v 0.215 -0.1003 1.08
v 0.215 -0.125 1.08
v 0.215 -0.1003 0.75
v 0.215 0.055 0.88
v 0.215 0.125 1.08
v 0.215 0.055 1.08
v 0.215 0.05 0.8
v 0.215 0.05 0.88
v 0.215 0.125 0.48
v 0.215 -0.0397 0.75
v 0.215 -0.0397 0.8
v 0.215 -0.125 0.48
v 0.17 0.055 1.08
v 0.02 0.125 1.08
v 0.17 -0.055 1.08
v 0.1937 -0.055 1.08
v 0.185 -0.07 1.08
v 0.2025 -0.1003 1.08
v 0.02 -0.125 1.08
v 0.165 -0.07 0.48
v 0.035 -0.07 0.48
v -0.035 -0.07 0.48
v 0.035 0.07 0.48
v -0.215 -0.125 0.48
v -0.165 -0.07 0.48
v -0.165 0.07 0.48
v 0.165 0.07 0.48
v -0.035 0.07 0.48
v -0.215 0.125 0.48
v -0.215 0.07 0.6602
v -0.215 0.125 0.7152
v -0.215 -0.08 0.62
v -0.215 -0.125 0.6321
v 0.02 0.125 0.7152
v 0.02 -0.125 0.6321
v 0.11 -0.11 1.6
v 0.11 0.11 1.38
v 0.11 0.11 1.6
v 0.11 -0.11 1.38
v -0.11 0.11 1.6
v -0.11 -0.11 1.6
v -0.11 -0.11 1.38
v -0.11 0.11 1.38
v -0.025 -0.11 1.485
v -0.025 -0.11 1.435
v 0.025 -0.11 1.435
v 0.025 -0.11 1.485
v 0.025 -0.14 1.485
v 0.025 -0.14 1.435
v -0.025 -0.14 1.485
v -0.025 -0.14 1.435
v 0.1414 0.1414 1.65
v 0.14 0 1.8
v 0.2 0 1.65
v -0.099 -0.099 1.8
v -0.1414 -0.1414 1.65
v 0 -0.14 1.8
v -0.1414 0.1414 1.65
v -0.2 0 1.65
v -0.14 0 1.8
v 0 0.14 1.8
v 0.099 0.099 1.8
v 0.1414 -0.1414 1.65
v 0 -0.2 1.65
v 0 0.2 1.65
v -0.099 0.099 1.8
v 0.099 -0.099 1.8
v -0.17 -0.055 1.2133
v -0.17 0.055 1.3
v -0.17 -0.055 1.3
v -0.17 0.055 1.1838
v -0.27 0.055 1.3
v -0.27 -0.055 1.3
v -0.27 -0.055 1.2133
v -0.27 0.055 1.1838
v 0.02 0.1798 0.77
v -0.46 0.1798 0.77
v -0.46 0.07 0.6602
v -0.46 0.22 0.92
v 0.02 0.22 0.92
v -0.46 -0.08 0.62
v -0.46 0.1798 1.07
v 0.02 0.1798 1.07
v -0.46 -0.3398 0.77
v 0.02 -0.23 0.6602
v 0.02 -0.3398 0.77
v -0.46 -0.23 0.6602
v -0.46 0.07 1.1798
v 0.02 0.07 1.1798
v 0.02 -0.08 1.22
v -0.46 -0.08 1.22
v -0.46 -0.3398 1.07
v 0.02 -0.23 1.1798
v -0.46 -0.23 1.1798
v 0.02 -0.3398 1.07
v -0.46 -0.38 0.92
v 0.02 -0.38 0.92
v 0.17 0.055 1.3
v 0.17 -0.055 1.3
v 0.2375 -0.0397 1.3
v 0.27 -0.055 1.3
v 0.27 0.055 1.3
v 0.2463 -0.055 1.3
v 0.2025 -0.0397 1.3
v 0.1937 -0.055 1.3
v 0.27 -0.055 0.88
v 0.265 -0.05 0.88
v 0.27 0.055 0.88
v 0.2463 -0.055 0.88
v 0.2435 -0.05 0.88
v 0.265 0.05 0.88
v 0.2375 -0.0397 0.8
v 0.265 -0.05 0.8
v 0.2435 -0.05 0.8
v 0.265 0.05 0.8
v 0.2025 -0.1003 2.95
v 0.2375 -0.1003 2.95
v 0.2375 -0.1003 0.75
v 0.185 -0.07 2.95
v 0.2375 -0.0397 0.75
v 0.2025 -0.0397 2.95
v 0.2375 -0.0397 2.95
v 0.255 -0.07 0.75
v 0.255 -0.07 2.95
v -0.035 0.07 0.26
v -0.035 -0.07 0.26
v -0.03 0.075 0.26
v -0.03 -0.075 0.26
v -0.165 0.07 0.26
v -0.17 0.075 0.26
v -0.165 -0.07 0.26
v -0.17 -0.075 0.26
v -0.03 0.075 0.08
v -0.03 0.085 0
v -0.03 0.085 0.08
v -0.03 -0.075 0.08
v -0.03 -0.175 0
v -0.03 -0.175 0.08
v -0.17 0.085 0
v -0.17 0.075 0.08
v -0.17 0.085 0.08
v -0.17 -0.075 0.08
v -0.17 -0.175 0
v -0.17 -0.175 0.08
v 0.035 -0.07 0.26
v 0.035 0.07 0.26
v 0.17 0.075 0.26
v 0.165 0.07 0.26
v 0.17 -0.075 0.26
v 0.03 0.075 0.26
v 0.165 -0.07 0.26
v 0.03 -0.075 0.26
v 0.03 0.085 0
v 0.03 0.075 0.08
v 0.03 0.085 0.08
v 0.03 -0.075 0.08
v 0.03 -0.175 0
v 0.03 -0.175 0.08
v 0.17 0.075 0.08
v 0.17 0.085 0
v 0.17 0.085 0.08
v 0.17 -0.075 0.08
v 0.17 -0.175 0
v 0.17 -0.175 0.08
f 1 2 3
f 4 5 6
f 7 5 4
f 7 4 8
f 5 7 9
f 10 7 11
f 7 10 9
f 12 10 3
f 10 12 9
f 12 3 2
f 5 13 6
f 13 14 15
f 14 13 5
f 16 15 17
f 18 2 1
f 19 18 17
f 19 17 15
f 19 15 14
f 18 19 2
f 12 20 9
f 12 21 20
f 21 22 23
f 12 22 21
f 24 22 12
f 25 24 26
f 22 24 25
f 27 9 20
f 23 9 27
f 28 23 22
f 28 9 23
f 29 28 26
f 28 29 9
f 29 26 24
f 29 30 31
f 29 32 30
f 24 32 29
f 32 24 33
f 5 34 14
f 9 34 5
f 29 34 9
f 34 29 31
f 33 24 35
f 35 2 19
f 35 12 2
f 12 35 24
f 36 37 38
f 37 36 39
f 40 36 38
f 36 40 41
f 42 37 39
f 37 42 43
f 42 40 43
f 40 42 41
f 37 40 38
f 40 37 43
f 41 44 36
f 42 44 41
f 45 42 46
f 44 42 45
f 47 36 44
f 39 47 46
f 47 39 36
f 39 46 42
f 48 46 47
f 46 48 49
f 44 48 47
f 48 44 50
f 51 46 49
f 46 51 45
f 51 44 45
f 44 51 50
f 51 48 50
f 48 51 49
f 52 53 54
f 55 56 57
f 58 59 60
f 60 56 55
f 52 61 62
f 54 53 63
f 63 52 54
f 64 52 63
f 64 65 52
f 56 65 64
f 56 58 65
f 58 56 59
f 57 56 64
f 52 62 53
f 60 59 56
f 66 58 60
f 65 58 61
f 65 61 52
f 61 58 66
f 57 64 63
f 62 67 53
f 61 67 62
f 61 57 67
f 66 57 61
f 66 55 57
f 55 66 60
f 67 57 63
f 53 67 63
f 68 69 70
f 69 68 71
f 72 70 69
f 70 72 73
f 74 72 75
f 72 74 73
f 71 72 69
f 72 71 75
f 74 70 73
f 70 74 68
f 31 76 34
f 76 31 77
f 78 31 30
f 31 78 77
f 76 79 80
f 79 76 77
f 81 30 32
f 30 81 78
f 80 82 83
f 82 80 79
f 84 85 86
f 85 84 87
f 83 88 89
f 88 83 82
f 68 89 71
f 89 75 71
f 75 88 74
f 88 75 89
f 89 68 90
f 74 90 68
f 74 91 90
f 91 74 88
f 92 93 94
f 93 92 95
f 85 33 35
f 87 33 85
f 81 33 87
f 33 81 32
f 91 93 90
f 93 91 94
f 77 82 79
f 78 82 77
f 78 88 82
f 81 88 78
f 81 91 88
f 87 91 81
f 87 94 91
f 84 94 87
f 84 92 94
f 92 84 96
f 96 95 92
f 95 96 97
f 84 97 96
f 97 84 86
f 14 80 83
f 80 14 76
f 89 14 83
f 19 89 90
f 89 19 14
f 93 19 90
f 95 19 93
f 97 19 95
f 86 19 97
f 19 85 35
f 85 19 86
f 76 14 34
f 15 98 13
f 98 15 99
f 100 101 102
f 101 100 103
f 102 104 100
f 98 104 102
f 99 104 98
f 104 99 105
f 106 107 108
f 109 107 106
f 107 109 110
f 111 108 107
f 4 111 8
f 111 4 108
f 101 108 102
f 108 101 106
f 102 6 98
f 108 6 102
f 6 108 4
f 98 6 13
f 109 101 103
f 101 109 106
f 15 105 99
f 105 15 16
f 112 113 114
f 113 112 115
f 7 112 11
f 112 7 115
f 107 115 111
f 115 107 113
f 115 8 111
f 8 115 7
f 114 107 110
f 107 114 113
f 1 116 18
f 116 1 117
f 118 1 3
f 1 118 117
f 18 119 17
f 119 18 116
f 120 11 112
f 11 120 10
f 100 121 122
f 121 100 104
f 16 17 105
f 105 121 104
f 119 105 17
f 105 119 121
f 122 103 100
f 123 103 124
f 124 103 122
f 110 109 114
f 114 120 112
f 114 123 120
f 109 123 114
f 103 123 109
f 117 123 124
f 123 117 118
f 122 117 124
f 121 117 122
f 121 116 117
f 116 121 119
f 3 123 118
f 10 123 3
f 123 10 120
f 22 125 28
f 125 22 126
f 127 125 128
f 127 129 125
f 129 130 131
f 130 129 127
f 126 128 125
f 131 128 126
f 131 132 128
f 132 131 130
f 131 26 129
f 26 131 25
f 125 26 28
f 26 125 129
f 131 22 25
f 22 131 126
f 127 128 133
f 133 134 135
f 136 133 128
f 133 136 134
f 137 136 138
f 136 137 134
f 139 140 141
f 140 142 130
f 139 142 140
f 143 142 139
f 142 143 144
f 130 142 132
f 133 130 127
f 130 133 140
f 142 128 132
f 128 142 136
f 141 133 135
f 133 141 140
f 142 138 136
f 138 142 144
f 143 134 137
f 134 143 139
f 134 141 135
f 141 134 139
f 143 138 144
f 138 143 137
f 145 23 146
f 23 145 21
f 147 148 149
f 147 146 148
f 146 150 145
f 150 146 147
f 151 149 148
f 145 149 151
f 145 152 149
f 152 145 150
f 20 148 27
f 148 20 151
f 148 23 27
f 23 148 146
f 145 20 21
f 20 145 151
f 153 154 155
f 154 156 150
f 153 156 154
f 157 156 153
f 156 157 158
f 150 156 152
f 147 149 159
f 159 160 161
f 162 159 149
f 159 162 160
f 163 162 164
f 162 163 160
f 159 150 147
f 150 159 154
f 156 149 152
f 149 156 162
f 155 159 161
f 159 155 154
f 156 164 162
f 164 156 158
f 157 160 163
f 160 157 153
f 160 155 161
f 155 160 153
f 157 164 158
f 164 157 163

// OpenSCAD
// file: ../lib/kit_tw.scad
// kit_tw.scad — NextTotalwar 低模战场与角色零件库。
// 纯零件库；落地件底面 z=0，带朝向件 front=-y。

use <kit_char.scad>

function tw_WOOD() = [0.30, 0.20, 0.12];
function tw_WOOD_DARK() = [0.18, 0.11, 0.07];
function tw_STONE() = [0.34, 0.34, 0.31];
function tw_METAL() = [0.20, 0.22, 0.23];
function tw_LEATHER() = [0.28, 0.16, 0.09];
function tw_CLOTH() = ch_TINT();
function tw_sq(x) = (x * x + x * 613 + 47) % 65521;
function tw_rnd(s, m) = tw_sq(tw_sq(((s % 65521) + 65521) % 65521) + 17) % m;

module tw_boxc(s) cube(s, center=true);
module tw_slab(L=4, D=4, t=0.2) translate([0, 0, t/2]) tw_boxc([L, D, t]);

module tw_bldg_palisade(L=8, H=2.7, seed=0)
{
    n = max(3, floor(L / 0.42));
    for (i=[0:n-1])
        color(i % 3 == 0 ? tw_WOOD_DARK() : tw_WOOD())
            translate([-L/2 + (i+0.5)*L/n, 0, H/2])
                cylinder(h=H, r=0.22, $fn=6, center=true);
    color(tw_WOOD_DARK()) for (z=[0.75, 1.8])
        translate([0, 0.12, z]) tw_boxc([L+0.15, 0.16, 0.14]);
}

module tw_bldg_watchtower(seed=0)
{
    H = 6.0;
    for (sx=[-1,1], sy=[-1,1])
        color(tw_WOOD_DARK())
            translate([sx*1.05, sy*1.05, H/2])
                rotate([sy*5, sx*-5, 0]) tw_boxc([0.20, 0.20, H]);
    color(tw_WOOD()) translate([0, 0, H]) tw_slab(3.4, 3.4, 0.22);
    color(tw_WOOD()) translate([0, 0, H+0.22]) tw_slab(2.5, 2.5, 1.25);
    color([0.22, 0.13, 0.08]) translate([0, 0, H+1.47])
        cylinder(h=1.15, r1=2.0, r2=0.15, $fn=4);
    color(tw_WOOD()) for (i=[0:7])
        translate([0, -1.28, 0.45+i*0.65]) tw_boxc([0.75, 0.08, 0.07]);
}

module tw_bldg_gatehouse(W=6, seed=0)
{
    color(tw_STONE()) for (sx=[-1,1])
        translate([sx*(W/2+1.0), 0, 1.8]) tw_boxc([1.8, 2.4, 3.6]);
    color(tw_WOOD()) translate([0, 0, 3.1]) tw_boxc([W, 1.1, 0.55]);
    color(tw_WOOD_DARK()) for (x=[-W/2+0.3:0.55:W/2-0.3])
        translate([x, 0, 1.35]) tw_boxc([0.16, 0.28, 2.7]);
}

module tw_bldg_hut(seed=0)
{
    color(tw_WOOD()) tw_slab(4.8, 3.8, 2.2);
    color([0.25, 0.15, 0.09]) translate([0, 0, 2.2])
        rotate([0, 0, 45]) cylinder(h=1.6, r1=3.25, r2=0.15, $fn=4);
    color([0.08, 0.07, 0.06]) translate([0, -1.94, 1.0]) tw_boxc([0.85, 0.08, 1.7]);
}

module tw_prop_banner(seed=0, tint=ch_TINT())
{
    color(tw_WOOD_DARK()) translate([0, 0, 1.9]) cylinder(h=3.8, r=0.055, $fn=6, center=true);
    color(tint) translate([0.58, 0, 3.05]) tw_boxc([1.15, 0.035, 0.85]);
    color(tw_METAL()) translate([0, 0, 3.86]) sphere(r=0.11, $fn=6);
}

module tw_prop_stakes(seed=0)
{
    for (i=[-1,0,1])
        color(tw_WOOD_DARK()) translate([i*1.1, 0, 0.88])
            rotate([45, 0, 0]) tw_boxc([0.13, 2.3, 0.13]);
    color(tw_WOOD()) translate([0, 0, 0.65]) tw_boxc([3.3, 0.15, 0.15]);
}

module tw_prop_cart(seed=0)
{
    color(tw_WOOD()) translate([0, 0, 0.75]) tw_boxc([2.2, 1.25, 0.18]);
    color(tw_WOOD_DARK()) for (sy=[-1,1])
        translate([-0.65, sy*0.72, 0.52]) rotate([90, 0, 0])
            cylinder(h=0.14, r=0.52, $fn=10, center=true);
    color(tw_WOOD_DARK()) for (sy=[-1,1])
        translate([1.65, sy*0.38, 1.10]) rotate([0, 75, 0]) tw_boxc([2.2, 0.10, 0.10]);
}

module tw_prop_haystack(seed=0)
{
    color([0.54, 0.38, 0.12]) cylinder(h=1.35, r1=1.25, r2=0.68, $fn=8);
    color([0.64, 0.48, 0.16]) translate([0, 0, 1.35])
        cylinder(h=0.65, r1=0.68, r2=0.08, $fn=8);
}

module tw_prop_marker(seed=0)
{
    color(ch_TINT()) tw_slab(1.6, 1.6, 0.045);
    color([0.85, 0.72, 0.22]) translate([0, 0, 0.05])
        cylinder(h=0.035, r=0.48, $fn=16);
}

module tw_head_soldier(style=0)
{
    ch_head_box(ch_SKIN(style % 3));
    color(style == 2 ? tw_LEATHER() : tw_METAL())
        translate([0, 0, 0.27]) cylinder(h=0.15, r1=0.20, r2=0.14, $fn=8);
}

module tw_torso_soldier(style=0, tint=ch_TINT())
{
    color(tint) translate([0, 0, -0.06]) tw_boxc([0.43, 0.25, 0.60]);
    color(style == 1 ? tw_METAL() : tw_LEATHER())
        translate([0, 0.07, -0.05]) tw_boxc([0.34, 0.08, 0.48]);
}

module tw_arm_soldier(style=0, tint=ch_TINT(), weapon=0)
{
    ch_arm_long(tint);
    if (weapon == 1)
        color(tw_WOOD_DARK()) translate([0, -0.07, -0.55]) cylinder(h=2.2, r=0.035, $fn=6);
    if (weapon == 2)
        color(tw_METAL()) translate([0, -0.10, -0.42]) rotate([8, 0, 0])
            tw_boxc([0.07, 0.06, 0.92]);
    if (weapon == 3)
        color(tw_WOOD()) translate([0, -0.08, -0.38])
            rotate([0, 90, 0]) cylinder(h=0.48, r=0.30, $fn=12, center=true);
}

module tw_leg_soldier(style=0) { ch_leg_boots([0.25, 0.22, 0.18], tw_LEATHER()); }
// main file
use <../lib/kit_char.scad>
use <../lib/kit_tw.scad>
$fn=8;
module bone_head(){ tw_head_soldier(0); }
module bone_arm_l(){ tw_arm_soldier(0, ch_TINT(), 3); }
module bone_arm_r(){ mirror([1,0,0]) tw_arm_soldier(0, ch_TINT(), 1); }
module bone_leg_l(){ tw_leg_soldier(0); }
module bone_leg_r(){ mirror([1,0,0]) tw_leg_soldier(0); }
module bone_torso(){
    tw_torso_soldier(0, ch_TINT());
    translate(ch_pivot_head()) bone_head();
    translate(ch_pivot_arm_l()) bone_arm_l();
    translate(ch_pivot_arm_r()) bone_arm_r();
}
module bone_root(){
    translate(ch_pivot_torso()) bone_torso();
    translate(ch_pivot_leg_l()) bone_leg_l();
    translate(ch_pivot_leg_r()) bone_leg_r();
}
bone_root();
anim_idle=ch_clip_idle();
anim_walk=ch_clip_walk();
anim_march=ch_clip_walk();
anim_run=ch_clip_walk();
